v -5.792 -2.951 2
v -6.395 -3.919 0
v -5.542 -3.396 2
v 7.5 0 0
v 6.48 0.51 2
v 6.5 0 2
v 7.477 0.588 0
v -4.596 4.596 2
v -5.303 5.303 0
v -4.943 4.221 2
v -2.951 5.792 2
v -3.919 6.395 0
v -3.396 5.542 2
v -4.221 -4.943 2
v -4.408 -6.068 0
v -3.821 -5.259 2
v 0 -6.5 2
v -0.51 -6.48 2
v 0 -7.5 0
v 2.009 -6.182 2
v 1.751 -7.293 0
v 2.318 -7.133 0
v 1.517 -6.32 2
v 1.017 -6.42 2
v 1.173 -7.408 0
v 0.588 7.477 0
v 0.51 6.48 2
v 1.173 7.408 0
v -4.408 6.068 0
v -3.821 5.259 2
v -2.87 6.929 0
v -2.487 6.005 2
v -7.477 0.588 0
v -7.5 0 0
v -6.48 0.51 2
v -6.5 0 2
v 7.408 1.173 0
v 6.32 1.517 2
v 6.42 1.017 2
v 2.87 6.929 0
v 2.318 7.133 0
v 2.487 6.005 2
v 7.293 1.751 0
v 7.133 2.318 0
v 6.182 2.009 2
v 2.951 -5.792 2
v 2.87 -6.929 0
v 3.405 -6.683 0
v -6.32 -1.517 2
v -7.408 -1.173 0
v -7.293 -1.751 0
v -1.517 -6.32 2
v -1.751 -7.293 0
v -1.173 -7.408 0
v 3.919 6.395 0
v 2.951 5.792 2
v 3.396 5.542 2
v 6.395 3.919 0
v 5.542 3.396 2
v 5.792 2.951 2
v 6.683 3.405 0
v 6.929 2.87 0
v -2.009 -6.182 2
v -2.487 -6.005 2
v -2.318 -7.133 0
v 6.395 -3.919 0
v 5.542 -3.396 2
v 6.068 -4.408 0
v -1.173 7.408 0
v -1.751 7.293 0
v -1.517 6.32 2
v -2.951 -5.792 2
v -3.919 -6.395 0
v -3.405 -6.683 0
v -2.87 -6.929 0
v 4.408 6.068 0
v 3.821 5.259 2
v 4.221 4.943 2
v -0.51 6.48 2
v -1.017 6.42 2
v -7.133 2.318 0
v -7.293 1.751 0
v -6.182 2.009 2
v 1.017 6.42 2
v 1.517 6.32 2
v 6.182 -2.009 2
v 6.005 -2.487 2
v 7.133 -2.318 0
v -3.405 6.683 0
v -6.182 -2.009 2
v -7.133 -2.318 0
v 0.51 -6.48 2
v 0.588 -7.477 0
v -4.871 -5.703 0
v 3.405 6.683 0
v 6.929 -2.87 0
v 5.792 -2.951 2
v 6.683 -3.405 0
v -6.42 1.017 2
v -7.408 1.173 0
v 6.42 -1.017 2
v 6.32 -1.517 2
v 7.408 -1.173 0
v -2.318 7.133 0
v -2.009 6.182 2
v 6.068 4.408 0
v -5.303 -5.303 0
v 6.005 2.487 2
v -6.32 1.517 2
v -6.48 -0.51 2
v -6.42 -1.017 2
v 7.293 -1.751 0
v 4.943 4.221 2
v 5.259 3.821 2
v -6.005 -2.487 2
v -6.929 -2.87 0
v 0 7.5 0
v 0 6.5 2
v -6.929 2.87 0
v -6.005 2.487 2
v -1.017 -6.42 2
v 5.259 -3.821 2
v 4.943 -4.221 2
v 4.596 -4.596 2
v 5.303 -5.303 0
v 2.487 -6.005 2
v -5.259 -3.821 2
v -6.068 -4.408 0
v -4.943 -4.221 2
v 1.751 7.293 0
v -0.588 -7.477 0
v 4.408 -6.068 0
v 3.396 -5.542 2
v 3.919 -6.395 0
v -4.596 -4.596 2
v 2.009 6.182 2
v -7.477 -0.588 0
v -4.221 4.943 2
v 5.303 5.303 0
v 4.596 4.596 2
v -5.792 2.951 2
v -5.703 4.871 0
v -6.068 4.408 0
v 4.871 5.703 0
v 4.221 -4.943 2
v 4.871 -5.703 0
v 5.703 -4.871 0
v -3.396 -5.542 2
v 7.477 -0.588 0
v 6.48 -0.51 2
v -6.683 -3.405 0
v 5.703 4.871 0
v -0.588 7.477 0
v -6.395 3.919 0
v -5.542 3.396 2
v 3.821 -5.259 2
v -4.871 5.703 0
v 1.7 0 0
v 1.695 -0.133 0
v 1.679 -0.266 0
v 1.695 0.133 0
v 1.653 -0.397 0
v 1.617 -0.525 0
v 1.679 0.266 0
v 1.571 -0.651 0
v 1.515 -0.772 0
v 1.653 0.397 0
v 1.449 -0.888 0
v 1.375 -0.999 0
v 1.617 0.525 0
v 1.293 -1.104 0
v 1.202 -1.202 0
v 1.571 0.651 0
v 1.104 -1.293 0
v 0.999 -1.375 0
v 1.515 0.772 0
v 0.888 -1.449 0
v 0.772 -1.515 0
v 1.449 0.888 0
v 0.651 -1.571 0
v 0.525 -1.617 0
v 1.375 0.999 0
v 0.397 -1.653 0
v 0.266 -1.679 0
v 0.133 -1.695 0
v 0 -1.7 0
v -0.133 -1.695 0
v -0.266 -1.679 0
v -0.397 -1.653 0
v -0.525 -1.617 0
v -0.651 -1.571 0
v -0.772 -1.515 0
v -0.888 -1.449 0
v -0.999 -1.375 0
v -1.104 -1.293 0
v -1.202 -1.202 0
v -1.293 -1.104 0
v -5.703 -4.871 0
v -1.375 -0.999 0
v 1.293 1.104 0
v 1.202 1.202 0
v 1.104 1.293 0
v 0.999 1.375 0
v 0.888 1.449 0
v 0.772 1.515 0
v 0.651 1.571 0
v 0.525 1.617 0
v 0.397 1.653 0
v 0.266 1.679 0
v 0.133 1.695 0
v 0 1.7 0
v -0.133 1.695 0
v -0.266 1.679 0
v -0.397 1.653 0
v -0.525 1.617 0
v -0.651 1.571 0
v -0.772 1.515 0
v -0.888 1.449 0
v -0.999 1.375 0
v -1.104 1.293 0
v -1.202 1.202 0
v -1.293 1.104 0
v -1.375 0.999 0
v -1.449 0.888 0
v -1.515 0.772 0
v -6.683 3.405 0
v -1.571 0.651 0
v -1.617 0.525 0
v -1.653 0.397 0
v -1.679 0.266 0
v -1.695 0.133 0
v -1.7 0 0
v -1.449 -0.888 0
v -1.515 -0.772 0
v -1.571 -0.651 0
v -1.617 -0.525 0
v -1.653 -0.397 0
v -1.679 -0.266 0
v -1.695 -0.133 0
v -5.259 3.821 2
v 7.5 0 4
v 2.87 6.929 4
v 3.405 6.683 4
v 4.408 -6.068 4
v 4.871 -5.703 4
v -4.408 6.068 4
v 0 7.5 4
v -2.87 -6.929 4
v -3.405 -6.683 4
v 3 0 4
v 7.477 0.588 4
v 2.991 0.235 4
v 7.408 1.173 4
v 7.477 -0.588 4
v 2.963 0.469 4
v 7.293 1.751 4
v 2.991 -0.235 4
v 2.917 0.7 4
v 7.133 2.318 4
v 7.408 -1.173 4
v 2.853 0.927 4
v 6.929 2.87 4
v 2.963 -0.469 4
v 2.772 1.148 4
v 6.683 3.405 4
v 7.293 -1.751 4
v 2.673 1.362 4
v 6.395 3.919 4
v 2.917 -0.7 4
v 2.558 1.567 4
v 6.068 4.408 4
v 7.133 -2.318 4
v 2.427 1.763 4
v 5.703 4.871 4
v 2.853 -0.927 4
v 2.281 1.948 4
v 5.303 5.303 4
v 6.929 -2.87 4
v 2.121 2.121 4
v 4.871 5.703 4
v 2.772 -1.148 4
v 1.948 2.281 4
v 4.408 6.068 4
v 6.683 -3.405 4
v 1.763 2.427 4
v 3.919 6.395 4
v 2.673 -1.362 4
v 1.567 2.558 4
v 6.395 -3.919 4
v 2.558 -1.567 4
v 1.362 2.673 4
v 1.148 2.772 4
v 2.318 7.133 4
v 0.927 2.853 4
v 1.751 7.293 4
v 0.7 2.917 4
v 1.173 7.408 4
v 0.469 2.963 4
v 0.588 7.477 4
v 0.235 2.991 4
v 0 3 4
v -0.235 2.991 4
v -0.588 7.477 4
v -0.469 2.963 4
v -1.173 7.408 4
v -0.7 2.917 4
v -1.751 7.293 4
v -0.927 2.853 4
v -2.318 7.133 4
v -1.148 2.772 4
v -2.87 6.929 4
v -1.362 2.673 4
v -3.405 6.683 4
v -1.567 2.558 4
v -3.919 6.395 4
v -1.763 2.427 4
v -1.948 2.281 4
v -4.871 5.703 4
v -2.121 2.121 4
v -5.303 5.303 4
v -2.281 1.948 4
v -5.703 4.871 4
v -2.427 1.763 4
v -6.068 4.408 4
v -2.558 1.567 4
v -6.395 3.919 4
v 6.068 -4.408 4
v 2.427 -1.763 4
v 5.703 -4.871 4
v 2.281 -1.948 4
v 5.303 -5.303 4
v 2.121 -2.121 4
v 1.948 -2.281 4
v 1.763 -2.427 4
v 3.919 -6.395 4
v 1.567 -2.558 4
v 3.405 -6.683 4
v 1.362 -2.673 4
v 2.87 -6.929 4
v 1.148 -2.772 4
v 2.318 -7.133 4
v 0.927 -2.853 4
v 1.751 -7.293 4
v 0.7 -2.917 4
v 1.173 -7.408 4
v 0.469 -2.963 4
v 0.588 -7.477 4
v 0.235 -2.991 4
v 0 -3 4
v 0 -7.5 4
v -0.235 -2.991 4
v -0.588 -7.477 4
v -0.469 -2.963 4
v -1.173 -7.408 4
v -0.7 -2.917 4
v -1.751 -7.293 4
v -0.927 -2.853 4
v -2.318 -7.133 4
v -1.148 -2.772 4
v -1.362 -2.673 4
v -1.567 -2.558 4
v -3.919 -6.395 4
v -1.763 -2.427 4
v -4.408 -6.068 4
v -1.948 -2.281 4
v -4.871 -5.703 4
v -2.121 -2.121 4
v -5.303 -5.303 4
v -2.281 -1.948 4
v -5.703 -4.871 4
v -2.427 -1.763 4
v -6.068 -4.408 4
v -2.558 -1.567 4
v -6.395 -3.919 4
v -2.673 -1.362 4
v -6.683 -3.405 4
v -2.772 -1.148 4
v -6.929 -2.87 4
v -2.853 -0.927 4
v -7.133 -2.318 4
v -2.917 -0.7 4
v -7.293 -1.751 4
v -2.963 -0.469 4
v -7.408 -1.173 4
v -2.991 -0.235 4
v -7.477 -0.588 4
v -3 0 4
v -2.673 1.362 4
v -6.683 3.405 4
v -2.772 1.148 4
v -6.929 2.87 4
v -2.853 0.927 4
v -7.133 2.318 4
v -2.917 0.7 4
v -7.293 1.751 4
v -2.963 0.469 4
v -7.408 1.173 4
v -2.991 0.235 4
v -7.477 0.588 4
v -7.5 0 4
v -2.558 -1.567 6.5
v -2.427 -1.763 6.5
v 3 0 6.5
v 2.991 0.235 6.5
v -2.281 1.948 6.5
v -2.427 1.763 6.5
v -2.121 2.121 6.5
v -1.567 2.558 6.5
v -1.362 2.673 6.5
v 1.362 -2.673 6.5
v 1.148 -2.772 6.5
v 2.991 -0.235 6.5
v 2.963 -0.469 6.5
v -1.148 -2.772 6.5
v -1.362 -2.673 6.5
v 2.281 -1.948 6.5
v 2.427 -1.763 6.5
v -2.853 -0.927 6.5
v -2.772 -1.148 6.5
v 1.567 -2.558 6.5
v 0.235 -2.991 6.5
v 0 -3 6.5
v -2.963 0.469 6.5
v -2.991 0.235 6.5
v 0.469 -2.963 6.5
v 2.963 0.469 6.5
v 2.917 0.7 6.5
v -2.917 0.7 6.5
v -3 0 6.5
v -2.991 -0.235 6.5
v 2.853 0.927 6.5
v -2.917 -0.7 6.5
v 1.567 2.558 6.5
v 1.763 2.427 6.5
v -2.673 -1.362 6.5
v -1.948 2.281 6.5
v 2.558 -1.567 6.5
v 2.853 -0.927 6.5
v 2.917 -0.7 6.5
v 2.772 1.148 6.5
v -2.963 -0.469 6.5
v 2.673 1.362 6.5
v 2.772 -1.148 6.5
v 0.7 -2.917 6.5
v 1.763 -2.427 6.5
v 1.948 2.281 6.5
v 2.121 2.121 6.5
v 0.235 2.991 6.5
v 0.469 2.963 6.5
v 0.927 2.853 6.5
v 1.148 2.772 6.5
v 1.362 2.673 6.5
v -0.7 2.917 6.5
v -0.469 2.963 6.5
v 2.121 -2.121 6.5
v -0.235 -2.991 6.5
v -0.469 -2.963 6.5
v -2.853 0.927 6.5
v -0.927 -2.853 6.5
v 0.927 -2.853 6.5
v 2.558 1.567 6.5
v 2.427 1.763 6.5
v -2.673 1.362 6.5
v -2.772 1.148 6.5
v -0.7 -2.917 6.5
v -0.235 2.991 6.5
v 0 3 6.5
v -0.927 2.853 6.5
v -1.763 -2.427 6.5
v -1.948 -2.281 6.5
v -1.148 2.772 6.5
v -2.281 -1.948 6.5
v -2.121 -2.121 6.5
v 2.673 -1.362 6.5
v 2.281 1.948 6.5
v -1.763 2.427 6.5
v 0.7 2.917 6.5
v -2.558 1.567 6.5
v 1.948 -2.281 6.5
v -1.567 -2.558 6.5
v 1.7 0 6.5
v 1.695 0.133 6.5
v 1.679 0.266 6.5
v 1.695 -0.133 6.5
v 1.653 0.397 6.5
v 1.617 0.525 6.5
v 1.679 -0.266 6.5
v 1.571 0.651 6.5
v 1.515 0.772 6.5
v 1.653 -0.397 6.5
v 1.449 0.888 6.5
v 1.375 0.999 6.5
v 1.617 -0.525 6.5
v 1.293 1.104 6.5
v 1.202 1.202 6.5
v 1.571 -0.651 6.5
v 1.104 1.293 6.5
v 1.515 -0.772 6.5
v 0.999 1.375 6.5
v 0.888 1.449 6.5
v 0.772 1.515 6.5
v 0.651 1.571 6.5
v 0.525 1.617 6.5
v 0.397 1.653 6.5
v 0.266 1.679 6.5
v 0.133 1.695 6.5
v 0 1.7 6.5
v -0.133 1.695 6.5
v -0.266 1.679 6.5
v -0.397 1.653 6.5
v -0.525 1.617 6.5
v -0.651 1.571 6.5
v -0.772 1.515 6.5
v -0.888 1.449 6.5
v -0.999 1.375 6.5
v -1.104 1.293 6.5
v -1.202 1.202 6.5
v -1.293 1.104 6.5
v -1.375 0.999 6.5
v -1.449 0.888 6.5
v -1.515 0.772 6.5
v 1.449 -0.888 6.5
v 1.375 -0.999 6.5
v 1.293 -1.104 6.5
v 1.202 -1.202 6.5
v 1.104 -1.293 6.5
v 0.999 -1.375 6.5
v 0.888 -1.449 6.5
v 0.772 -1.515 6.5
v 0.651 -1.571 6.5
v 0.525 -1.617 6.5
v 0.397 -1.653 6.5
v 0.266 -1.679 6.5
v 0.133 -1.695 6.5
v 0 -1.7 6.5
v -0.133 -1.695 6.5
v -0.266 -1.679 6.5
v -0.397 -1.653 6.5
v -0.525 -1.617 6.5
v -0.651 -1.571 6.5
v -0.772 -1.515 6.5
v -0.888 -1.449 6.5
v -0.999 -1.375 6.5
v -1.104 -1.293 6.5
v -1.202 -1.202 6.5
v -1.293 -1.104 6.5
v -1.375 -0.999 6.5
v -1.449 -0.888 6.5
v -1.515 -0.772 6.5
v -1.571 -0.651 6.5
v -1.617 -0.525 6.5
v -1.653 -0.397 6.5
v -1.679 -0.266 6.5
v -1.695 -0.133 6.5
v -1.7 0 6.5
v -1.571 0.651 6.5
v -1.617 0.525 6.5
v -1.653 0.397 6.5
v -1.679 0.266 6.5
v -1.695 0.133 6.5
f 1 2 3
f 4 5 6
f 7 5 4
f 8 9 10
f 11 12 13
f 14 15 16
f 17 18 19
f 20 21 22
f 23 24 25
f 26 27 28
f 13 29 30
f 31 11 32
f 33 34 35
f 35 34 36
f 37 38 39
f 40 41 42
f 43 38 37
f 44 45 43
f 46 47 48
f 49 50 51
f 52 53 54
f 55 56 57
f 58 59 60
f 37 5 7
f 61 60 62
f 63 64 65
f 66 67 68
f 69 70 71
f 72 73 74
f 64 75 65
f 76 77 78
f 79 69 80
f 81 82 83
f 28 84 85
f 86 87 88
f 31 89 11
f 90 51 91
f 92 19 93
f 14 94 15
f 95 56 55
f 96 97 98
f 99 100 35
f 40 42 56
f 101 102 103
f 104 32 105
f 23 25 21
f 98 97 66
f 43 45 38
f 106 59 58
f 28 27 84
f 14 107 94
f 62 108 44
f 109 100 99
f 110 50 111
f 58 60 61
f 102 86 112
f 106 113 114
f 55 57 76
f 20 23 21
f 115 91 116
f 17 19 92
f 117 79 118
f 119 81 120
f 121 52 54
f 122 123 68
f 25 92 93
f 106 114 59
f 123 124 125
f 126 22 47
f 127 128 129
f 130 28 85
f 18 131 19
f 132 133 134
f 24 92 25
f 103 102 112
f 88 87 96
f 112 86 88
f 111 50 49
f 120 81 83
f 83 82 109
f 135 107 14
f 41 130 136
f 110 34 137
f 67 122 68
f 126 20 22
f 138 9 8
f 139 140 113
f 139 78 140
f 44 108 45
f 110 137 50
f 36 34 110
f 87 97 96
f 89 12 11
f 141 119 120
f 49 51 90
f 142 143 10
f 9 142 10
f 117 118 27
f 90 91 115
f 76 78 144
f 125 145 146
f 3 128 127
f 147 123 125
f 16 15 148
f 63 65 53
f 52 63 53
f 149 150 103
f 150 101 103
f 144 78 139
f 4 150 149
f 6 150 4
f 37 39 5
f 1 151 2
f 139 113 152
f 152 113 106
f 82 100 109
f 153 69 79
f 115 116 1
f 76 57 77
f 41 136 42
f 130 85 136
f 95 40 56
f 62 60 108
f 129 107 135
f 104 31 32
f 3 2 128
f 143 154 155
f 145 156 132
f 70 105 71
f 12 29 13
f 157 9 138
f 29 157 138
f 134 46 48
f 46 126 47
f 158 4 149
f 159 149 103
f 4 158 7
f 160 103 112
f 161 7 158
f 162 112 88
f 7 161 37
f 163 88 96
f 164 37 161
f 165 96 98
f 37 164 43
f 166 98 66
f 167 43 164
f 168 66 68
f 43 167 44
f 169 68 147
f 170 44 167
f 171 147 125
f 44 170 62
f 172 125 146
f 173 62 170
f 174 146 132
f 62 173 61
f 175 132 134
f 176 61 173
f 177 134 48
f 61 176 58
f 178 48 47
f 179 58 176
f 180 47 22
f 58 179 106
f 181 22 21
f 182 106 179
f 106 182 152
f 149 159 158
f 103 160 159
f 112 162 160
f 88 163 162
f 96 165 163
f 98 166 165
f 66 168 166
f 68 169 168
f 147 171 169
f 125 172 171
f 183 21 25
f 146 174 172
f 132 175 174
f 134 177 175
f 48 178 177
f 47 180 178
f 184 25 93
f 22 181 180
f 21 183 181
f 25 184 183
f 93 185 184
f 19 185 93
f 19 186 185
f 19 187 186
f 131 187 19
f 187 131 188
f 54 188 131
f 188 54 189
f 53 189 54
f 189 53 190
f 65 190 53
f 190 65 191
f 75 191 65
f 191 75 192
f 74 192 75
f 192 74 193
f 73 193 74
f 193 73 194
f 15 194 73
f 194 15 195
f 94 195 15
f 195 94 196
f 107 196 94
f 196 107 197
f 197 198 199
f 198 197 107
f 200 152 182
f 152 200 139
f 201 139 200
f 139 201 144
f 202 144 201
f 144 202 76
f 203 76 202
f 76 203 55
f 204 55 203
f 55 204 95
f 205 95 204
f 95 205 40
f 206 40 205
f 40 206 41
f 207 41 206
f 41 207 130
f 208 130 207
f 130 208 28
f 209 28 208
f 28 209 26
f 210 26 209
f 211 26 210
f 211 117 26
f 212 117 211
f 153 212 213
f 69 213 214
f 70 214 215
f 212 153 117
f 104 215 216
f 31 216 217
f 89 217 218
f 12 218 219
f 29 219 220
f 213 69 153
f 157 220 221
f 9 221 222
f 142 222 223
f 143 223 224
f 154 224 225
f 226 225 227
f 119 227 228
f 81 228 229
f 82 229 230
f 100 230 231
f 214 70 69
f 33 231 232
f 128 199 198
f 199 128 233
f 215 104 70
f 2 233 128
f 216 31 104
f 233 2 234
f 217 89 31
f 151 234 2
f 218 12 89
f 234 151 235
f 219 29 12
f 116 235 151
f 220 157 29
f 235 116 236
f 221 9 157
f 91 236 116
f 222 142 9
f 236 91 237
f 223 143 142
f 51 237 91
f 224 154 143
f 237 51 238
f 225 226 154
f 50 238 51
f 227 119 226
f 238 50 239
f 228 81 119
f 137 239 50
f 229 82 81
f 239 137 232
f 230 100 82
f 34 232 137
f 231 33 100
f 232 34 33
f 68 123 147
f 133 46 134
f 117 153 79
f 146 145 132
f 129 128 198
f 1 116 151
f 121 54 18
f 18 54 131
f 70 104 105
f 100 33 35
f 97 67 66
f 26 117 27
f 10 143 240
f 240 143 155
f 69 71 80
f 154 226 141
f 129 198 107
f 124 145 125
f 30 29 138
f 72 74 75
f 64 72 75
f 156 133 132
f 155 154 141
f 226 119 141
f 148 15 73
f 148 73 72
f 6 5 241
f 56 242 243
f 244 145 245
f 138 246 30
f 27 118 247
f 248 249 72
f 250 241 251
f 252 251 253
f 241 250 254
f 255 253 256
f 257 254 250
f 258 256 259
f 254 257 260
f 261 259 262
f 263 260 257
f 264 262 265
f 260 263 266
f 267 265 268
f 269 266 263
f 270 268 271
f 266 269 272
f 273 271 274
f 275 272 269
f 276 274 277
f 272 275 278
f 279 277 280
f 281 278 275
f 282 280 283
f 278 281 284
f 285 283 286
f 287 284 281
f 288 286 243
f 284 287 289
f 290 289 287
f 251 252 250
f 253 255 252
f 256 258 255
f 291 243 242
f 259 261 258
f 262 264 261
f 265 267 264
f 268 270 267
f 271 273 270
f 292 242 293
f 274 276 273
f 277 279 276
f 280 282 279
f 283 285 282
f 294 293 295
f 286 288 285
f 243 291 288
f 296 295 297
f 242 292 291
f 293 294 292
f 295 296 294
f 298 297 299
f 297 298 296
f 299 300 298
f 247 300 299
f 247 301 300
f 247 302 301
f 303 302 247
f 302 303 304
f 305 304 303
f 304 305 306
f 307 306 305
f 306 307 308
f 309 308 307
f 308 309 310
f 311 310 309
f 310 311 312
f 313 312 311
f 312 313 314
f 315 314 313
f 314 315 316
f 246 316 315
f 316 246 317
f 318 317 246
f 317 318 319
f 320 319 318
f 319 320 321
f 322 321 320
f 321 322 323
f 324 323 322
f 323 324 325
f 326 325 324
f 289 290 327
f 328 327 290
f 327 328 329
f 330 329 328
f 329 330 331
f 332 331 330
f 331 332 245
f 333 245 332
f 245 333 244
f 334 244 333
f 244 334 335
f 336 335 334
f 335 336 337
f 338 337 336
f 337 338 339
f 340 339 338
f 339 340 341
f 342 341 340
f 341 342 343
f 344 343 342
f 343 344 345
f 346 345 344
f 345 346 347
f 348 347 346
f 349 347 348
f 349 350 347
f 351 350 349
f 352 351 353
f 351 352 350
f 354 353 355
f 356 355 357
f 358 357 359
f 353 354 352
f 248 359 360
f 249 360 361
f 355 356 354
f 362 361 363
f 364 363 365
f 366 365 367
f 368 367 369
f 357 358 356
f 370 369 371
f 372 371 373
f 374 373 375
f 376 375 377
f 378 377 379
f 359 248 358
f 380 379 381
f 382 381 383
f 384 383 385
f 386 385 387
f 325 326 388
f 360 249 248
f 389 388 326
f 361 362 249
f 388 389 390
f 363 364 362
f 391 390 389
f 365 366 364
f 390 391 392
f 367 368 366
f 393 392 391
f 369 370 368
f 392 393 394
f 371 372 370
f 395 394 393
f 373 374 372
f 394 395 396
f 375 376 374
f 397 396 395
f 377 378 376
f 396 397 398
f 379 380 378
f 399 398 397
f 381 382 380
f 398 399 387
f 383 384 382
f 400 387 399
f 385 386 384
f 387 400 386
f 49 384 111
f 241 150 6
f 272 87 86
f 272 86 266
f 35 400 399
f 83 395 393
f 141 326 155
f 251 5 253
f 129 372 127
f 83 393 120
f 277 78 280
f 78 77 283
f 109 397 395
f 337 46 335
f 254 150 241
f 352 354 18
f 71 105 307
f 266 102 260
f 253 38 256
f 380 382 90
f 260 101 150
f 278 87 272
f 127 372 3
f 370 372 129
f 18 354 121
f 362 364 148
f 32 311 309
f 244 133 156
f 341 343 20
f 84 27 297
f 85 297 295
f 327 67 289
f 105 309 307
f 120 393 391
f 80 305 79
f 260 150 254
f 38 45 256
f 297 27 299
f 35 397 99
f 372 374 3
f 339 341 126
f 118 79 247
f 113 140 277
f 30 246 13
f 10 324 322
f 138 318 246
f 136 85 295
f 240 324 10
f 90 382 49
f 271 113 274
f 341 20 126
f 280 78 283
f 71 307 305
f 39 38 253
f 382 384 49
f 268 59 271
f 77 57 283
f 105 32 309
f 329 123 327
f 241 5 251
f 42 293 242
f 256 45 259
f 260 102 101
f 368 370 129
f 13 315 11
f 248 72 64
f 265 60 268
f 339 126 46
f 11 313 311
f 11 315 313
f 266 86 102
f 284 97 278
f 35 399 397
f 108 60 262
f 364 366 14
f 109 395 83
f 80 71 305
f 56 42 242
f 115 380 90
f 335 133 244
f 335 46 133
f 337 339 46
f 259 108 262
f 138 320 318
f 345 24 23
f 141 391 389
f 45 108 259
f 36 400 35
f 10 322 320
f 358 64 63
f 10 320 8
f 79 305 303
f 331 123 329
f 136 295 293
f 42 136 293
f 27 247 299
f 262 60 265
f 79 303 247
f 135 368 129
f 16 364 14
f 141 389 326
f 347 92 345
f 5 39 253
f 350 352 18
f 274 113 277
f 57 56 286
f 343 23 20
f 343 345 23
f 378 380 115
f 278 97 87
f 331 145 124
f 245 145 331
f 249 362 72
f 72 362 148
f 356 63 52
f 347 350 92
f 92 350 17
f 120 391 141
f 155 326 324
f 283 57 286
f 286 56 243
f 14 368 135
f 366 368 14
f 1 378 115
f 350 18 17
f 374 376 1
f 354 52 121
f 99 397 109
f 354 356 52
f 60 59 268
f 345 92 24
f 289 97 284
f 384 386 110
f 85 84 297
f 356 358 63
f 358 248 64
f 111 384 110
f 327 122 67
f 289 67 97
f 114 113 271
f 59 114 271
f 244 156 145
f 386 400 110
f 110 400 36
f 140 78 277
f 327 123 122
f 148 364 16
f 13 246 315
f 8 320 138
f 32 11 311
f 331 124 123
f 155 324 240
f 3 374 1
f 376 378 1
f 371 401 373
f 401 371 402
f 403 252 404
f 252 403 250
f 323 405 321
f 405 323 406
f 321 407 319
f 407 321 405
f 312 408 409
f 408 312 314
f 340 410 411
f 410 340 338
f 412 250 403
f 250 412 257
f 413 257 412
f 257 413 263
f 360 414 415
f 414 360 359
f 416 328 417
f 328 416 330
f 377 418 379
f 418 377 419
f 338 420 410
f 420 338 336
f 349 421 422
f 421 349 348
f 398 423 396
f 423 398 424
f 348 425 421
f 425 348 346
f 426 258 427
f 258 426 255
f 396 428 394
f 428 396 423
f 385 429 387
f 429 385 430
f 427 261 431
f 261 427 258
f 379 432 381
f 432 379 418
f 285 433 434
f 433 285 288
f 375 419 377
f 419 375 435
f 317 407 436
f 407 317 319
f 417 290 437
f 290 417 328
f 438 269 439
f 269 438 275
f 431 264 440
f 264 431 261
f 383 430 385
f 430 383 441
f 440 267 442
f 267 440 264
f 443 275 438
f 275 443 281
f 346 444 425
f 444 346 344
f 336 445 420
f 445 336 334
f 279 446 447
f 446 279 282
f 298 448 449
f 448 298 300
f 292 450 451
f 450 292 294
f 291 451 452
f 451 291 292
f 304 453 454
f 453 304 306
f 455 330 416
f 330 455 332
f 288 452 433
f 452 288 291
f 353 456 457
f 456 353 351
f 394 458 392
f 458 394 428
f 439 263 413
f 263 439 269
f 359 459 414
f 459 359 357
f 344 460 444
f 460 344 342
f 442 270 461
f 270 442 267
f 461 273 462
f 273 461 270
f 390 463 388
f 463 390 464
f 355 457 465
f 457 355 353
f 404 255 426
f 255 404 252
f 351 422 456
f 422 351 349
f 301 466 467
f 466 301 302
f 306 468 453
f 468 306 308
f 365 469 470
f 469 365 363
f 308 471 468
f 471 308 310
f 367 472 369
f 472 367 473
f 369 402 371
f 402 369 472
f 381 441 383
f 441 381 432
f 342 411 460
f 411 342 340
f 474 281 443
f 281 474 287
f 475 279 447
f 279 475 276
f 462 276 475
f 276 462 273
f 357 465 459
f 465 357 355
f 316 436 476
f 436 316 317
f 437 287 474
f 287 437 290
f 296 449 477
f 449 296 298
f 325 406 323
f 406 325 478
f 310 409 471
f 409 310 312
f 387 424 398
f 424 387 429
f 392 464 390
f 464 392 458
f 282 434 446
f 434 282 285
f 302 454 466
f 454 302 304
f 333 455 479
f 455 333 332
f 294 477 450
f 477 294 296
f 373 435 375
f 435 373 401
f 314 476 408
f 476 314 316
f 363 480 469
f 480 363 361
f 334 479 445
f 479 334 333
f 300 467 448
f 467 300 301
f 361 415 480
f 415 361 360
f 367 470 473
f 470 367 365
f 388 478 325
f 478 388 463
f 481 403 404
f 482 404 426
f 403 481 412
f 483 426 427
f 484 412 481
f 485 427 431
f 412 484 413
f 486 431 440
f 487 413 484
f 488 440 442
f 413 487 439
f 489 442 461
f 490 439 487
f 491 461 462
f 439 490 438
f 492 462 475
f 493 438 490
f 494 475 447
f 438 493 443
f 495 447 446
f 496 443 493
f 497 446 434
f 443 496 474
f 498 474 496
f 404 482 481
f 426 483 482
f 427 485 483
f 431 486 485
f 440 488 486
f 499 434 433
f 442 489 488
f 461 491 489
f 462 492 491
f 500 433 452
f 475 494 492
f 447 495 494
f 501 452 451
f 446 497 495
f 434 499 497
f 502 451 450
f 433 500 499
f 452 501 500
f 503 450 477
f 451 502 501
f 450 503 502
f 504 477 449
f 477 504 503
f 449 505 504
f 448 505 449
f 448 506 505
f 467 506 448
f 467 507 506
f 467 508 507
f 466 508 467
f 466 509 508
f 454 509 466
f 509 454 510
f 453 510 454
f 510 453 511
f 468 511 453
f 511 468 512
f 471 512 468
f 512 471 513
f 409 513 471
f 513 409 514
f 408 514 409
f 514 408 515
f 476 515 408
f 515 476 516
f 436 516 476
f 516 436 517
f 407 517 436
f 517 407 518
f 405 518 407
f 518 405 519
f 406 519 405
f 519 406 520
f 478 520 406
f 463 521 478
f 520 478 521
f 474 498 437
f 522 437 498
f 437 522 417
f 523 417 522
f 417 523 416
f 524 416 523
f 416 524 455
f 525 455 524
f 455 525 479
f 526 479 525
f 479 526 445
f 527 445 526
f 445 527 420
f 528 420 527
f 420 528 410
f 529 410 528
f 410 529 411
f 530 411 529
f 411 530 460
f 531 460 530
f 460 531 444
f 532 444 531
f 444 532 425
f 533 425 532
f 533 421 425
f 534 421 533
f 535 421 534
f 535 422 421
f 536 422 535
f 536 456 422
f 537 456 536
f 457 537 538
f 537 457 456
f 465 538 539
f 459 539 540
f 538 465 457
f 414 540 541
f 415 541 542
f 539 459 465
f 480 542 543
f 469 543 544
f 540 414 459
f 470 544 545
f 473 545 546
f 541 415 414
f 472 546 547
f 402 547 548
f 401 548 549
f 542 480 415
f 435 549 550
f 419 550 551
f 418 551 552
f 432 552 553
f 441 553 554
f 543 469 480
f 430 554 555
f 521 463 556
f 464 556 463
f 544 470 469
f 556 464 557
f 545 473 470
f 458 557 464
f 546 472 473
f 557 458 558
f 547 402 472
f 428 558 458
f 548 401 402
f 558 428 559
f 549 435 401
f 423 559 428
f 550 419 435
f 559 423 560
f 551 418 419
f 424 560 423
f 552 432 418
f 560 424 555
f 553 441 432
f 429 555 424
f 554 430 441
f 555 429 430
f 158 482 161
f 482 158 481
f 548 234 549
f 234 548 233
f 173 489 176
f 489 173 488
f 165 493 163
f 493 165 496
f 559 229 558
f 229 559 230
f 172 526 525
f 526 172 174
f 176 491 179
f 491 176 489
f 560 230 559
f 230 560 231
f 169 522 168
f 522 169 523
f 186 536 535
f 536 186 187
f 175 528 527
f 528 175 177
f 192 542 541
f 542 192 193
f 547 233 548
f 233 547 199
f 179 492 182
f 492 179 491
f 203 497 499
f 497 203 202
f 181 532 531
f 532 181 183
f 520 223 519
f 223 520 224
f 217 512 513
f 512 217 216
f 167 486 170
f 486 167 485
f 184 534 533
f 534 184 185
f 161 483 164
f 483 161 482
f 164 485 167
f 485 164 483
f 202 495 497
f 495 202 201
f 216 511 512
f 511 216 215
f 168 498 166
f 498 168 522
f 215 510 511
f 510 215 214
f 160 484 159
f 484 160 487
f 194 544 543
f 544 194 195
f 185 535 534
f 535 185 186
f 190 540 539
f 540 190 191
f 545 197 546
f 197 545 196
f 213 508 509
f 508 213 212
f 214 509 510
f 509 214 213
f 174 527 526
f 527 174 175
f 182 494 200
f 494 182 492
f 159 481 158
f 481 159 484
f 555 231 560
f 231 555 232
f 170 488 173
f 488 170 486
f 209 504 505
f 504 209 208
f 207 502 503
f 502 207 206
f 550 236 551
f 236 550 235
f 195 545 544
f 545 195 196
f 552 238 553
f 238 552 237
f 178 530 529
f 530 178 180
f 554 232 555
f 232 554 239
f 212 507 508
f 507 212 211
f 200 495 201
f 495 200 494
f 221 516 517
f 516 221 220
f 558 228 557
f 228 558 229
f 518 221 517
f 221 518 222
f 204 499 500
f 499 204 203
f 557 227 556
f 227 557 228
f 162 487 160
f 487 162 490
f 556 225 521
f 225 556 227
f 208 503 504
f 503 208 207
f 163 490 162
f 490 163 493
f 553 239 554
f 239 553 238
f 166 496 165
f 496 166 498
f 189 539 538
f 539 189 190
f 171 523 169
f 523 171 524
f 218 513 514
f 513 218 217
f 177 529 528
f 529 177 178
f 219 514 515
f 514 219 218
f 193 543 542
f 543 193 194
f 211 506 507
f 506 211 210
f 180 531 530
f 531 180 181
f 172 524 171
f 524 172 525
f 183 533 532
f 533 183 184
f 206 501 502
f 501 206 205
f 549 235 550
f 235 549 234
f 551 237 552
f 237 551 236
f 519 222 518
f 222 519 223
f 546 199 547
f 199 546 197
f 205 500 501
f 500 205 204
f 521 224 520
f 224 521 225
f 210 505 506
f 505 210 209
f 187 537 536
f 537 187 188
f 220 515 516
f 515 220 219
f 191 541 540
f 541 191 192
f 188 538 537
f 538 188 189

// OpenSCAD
// file: components/wheel.scad
module components_weel_WireWeel(diam1, diam2, diam3, wheel_transition_border1, wheel_transition_border2, wheel_size, fn = 80) {
    wheel_flat_size = (wheel_size - wheel_transition_border1 - wheel_transition_border2);
    cylinder(h = wheel_transition_border1, r1= diam1 / 2, r2= diam2 / 2, $fn = fn);

    translate([0,0,wheel_transition_border1]) {
        cylinder(h = wheel_flat_size, r = diam2 / 2, $fn = fn);
        translate([0,0,wheel_flat_size]) {
            cylinder(h = wheel_transition_border2, r1= diam2 / 2, r2 = diam3 / 2, $fn = fn);
        }
    }
}
// main file
include <components/wheel.scad>

SupportWheel();

module SupportWheel() {

    //include <params/motor-reel-wheel.scad>

    epsilon = 0.1;

    diam1 = 15;
    diam2 = 13;
    diam3 = diam1;
    b1_size = 2;
    b2_size = b1_size;
    wheel_size = 4;
    fn = 80;

    axis_throw_diam = 3.4;

    wheel_separator_diam = 6;
    wheel_separator_size = 5;

    difference() {
        union() {
            components_weel_WireWeel(diam1, diam2, diam3, b1_size, b2_size, wheel_size, fn);
            translate([0,0,wheel_size])
            cylinder(d = wheel_separator_diam, h = wheel_separator_size, center=true, $fn = fn);
        }
        cylinder(d = axis_throw_diam, h = wheel_size * 4, center=true, $fn = fn);
    }

}
